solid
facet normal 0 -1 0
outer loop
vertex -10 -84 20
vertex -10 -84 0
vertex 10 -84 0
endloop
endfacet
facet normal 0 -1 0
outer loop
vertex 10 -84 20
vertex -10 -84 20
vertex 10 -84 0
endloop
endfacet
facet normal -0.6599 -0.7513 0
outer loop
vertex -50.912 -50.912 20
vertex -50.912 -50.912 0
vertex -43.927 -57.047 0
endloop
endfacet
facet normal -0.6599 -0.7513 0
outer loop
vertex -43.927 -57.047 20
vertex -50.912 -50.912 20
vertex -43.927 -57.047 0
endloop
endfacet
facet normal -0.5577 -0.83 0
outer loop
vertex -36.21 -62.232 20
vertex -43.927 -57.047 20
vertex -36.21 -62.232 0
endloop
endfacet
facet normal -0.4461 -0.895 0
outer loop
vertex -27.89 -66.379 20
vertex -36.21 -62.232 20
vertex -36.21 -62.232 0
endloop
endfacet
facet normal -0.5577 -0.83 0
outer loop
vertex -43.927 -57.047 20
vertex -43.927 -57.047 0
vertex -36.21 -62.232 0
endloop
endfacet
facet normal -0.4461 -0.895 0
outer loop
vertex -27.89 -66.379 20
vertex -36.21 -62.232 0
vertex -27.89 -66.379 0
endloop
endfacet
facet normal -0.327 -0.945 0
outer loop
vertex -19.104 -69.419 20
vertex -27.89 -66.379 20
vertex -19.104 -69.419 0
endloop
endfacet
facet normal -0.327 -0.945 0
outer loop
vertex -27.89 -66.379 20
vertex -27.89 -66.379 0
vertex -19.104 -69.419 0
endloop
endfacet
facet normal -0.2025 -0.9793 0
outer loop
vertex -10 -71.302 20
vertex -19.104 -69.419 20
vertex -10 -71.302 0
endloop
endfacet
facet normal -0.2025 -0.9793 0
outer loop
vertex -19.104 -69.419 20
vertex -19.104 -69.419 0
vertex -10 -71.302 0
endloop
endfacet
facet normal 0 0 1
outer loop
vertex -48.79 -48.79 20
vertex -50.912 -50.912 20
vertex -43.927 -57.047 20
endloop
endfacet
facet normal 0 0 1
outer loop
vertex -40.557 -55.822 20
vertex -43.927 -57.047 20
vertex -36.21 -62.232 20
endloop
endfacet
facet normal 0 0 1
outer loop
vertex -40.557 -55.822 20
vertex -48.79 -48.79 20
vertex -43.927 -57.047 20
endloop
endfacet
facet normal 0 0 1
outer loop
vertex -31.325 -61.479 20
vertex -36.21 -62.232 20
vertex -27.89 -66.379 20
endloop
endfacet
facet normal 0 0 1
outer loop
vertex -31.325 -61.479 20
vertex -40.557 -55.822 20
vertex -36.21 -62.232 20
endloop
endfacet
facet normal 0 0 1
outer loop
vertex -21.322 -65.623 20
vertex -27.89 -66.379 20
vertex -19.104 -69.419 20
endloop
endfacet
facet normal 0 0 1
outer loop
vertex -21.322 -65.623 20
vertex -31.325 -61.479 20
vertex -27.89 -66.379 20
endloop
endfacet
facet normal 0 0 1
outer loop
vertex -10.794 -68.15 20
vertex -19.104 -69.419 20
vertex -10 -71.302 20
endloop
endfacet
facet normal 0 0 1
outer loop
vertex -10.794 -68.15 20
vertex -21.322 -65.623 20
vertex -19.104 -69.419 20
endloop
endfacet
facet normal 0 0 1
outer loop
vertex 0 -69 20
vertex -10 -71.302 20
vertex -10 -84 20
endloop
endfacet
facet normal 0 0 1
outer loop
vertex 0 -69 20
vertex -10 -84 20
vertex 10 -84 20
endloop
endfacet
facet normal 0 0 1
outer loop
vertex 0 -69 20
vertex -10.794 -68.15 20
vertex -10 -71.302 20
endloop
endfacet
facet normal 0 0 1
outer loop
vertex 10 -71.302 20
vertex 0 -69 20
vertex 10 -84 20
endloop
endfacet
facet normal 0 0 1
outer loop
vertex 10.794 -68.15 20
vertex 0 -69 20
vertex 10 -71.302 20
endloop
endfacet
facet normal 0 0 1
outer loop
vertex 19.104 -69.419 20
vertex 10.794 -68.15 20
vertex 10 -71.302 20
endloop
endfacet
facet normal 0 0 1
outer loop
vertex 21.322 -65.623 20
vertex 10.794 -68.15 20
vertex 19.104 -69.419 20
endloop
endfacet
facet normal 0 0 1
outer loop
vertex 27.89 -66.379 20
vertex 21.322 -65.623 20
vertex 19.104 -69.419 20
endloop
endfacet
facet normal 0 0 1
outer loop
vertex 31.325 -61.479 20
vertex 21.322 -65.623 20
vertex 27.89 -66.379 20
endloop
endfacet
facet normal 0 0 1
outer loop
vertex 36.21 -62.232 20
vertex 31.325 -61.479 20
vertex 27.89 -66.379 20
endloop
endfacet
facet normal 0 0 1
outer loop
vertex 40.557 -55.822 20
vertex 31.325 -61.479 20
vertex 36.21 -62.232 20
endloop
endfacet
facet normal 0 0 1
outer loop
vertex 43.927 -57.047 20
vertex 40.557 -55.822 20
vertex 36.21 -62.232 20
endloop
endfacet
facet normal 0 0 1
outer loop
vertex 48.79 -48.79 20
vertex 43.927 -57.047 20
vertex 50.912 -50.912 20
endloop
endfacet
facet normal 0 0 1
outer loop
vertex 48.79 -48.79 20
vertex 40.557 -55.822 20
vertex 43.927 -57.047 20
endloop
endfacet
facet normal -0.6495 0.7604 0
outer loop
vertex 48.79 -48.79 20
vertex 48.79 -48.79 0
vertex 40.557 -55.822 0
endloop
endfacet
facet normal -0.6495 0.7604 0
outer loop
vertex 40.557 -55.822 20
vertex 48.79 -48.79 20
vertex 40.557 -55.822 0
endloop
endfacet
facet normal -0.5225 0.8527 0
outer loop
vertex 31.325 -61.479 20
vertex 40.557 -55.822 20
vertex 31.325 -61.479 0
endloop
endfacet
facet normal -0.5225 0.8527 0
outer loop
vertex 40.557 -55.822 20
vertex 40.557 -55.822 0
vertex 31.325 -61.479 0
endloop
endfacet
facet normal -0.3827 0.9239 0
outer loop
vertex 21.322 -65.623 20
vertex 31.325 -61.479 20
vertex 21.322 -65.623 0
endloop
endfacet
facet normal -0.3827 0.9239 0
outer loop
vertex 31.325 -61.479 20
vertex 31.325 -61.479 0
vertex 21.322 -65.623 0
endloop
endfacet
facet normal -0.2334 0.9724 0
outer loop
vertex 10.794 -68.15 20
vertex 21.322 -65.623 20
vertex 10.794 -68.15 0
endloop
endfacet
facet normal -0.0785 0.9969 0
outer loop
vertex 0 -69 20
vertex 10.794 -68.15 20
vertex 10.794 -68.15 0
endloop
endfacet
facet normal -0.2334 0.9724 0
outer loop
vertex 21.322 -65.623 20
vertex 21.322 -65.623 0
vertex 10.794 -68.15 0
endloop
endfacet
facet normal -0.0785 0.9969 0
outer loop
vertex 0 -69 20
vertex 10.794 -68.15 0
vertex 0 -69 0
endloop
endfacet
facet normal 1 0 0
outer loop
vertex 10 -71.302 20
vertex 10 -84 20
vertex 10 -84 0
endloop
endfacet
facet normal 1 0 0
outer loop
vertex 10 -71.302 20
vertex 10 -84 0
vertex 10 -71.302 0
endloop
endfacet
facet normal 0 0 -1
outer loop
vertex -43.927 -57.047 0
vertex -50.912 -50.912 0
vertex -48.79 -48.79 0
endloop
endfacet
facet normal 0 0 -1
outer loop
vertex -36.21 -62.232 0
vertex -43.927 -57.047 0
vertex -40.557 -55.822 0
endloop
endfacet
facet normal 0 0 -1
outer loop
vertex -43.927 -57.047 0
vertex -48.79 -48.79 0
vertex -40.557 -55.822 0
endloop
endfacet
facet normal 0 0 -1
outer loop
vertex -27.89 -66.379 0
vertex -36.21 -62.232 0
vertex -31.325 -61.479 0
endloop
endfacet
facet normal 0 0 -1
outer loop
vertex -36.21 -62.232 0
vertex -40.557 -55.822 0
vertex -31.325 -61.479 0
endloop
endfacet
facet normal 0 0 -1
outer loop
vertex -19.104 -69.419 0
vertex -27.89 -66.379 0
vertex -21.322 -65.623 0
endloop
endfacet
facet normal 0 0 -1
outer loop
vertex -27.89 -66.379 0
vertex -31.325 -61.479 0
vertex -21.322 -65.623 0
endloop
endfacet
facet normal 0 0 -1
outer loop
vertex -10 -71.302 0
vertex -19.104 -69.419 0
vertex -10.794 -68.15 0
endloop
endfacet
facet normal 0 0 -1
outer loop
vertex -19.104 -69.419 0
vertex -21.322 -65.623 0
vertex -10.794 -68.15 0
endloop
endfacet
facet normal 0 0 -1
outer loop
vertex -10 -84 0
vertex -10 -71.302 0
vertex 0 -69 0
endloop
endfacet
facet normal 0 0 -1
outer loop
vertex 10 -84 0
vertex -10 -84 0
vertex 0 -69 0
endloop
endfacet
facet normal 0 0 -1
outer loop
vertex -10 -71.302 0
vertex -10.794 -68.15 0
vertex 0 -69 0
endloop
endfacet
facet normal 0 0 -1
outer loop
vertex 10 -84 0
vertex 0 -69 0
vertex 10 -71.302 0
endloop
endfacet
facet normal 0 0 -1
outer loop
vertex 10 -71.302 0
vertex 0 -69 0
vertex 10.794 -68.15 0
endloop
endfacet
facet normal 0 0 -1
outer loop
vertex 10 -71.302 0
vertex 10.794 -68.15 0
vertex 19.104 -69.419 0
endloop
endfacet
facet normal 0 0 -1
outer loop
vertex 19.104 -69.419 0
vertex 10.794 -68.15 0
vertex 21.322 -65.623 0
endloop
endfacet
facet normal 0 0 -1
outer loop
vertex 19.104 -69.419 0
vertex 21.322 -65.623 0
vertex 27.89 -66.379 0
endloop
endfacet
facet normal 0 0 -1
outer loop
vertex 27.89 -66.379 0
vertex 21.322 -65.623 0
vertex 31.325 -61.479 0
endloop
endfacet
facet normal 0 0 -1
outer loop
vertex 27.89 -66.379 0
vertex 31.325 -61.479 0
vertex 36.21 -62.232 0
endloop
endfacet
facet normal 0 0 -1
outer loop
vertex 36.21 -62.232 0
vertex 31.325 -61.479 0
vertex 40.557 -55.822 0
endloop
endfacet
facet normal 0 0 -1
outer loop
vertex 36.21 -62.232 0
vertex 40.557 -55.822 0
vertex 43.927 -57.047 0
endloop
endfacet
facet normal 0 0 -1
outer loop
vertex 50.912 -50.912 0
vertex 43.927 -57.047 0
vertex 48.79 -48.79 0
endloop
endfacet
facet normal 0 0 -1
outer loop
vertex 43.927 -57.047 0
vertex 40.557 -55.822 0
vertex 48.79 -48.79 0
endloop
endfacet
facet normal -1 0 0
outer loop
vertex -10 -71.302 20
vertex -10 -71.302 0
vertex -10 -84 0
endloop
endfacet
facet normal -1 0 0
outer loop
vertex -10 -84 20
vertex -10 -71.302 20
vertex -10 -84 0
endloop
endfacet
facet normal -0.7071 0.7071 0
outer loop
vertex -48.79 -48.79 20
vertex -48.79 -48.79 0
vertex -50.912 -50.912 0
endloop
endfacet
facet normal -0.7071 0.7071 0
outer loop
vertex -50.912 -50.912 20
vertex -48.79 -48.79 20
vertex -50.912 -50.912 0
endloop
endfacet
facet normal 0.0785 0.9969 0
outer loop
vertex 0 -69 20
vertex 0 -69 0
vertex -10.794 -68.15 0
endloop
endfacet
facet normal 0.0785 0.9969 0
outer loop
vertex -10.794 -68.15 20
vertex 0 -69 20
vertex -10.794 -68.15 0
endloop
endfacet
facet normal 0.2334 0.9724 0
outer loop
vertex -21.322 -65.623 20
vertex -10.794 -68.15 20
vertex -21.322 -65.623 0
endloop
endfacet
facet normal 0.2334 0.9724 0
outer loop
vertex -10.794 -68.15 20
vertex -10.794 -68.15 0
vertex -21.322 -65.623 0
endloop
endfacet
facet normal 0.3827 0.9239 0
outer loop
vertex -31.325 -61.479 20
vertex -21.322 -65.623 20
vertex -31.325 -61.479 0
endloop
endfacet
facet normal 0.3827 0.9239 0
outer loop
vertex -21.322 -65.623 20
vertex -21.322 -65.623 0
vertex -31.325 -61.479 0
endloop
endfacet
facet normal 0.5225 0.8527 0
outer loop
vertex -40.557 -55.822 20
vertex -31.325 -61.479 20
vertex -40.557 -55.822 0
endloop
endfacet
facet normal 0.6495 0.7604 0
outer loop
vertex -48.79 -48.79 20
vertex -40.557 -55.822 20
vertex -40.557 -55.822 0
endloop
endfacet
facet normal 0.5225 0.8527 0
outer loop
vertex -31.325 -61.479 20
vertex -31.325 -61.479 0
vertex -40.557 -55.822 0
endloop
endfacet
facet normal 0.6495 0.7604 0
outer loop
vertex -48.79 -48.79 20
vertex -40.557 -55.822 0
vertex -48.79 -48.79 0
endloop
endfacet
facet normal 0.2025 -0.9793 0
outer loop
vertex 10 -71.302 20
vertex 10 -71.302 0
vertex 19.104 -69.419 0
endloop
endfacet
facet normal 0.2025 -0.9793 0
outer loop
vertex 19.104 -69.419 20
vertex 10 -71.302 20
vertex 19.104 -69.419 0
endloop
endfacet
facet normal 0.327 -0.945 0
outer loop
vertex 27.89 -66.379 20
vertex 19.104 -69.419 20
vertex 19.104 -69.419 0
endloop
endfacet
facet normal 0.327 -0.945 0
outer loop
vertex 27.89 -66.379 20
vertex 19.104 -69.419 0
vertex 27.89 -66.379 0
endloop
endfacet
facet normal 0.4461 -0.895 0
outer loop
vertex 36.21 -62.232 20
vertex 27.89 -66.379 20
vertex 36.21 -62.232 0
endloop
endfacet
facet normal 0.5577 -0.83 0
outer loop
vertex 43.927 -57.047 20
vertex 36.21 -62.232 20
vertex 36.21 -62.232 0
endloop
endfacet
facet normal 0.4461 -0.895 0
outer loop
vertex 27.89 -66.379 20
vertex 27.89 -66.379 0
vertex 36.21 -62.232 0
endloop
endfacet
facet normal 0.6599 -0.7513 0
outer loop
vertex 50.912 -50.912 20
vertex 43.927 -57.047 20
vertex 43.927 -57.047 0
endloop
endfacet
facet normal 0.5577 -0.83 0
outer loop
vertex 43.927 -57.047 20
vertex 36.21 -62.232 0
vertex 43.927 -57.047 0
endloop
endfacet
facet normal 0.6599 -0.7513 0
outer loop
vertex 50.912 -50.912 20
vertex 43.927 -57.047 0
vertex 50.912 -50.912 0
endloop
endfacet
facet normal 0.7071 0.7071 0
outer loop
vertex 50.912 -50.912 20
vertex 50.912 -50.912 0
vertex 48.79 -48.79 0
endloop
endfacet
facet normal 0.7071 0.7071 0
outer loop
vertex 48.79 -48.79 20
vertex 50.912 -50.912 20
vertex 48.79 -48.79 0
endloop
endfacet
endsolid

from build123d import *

# Parameters (mm, degrees)
F1_DEPTH = 20


with BuildPart() as f1:
    # F0 (on Top) → F1 (new body)
    with BuildSketch(Plane.XY):
        with BuildLine():
            Line((0, -69), (10, -69))
            Line((10, -69), (10, -71.302174))
            ThreePointArc((10, -71.302174), (32.116996, -64.439883), (50.911688, -50.911688))
            Line((50.911688, -50.911688), (48.790368, -48.790368))
            ThreePointArc((48.790368, -48.790368), (26.405157, -63.747688), (0, -69))
        make_face()
        Polygon((10, -71.302174), (10, -69), (0, -69), (-10, -69), (-10, -71.302174), (-10, -84), (10, -84), align=None)
        with BuildLine():
            Line((-10, -69), (0, -69))
            ThreePointArc((0, -69), (-26.405157, -63.747688), (-48.790368, -48.790368))
            Line((-48.790368, -48.790368), (-50.911688, -50.911688))
            ThreePointArc((-50.911688, -50.911688), (-32.116996, -64.439883), (-10, -71.302174))
            Line((-10, -71.302174), (-10, -69))
        make_face()
    extrude(amount=F1_DEPTH)


solid = f1.part
